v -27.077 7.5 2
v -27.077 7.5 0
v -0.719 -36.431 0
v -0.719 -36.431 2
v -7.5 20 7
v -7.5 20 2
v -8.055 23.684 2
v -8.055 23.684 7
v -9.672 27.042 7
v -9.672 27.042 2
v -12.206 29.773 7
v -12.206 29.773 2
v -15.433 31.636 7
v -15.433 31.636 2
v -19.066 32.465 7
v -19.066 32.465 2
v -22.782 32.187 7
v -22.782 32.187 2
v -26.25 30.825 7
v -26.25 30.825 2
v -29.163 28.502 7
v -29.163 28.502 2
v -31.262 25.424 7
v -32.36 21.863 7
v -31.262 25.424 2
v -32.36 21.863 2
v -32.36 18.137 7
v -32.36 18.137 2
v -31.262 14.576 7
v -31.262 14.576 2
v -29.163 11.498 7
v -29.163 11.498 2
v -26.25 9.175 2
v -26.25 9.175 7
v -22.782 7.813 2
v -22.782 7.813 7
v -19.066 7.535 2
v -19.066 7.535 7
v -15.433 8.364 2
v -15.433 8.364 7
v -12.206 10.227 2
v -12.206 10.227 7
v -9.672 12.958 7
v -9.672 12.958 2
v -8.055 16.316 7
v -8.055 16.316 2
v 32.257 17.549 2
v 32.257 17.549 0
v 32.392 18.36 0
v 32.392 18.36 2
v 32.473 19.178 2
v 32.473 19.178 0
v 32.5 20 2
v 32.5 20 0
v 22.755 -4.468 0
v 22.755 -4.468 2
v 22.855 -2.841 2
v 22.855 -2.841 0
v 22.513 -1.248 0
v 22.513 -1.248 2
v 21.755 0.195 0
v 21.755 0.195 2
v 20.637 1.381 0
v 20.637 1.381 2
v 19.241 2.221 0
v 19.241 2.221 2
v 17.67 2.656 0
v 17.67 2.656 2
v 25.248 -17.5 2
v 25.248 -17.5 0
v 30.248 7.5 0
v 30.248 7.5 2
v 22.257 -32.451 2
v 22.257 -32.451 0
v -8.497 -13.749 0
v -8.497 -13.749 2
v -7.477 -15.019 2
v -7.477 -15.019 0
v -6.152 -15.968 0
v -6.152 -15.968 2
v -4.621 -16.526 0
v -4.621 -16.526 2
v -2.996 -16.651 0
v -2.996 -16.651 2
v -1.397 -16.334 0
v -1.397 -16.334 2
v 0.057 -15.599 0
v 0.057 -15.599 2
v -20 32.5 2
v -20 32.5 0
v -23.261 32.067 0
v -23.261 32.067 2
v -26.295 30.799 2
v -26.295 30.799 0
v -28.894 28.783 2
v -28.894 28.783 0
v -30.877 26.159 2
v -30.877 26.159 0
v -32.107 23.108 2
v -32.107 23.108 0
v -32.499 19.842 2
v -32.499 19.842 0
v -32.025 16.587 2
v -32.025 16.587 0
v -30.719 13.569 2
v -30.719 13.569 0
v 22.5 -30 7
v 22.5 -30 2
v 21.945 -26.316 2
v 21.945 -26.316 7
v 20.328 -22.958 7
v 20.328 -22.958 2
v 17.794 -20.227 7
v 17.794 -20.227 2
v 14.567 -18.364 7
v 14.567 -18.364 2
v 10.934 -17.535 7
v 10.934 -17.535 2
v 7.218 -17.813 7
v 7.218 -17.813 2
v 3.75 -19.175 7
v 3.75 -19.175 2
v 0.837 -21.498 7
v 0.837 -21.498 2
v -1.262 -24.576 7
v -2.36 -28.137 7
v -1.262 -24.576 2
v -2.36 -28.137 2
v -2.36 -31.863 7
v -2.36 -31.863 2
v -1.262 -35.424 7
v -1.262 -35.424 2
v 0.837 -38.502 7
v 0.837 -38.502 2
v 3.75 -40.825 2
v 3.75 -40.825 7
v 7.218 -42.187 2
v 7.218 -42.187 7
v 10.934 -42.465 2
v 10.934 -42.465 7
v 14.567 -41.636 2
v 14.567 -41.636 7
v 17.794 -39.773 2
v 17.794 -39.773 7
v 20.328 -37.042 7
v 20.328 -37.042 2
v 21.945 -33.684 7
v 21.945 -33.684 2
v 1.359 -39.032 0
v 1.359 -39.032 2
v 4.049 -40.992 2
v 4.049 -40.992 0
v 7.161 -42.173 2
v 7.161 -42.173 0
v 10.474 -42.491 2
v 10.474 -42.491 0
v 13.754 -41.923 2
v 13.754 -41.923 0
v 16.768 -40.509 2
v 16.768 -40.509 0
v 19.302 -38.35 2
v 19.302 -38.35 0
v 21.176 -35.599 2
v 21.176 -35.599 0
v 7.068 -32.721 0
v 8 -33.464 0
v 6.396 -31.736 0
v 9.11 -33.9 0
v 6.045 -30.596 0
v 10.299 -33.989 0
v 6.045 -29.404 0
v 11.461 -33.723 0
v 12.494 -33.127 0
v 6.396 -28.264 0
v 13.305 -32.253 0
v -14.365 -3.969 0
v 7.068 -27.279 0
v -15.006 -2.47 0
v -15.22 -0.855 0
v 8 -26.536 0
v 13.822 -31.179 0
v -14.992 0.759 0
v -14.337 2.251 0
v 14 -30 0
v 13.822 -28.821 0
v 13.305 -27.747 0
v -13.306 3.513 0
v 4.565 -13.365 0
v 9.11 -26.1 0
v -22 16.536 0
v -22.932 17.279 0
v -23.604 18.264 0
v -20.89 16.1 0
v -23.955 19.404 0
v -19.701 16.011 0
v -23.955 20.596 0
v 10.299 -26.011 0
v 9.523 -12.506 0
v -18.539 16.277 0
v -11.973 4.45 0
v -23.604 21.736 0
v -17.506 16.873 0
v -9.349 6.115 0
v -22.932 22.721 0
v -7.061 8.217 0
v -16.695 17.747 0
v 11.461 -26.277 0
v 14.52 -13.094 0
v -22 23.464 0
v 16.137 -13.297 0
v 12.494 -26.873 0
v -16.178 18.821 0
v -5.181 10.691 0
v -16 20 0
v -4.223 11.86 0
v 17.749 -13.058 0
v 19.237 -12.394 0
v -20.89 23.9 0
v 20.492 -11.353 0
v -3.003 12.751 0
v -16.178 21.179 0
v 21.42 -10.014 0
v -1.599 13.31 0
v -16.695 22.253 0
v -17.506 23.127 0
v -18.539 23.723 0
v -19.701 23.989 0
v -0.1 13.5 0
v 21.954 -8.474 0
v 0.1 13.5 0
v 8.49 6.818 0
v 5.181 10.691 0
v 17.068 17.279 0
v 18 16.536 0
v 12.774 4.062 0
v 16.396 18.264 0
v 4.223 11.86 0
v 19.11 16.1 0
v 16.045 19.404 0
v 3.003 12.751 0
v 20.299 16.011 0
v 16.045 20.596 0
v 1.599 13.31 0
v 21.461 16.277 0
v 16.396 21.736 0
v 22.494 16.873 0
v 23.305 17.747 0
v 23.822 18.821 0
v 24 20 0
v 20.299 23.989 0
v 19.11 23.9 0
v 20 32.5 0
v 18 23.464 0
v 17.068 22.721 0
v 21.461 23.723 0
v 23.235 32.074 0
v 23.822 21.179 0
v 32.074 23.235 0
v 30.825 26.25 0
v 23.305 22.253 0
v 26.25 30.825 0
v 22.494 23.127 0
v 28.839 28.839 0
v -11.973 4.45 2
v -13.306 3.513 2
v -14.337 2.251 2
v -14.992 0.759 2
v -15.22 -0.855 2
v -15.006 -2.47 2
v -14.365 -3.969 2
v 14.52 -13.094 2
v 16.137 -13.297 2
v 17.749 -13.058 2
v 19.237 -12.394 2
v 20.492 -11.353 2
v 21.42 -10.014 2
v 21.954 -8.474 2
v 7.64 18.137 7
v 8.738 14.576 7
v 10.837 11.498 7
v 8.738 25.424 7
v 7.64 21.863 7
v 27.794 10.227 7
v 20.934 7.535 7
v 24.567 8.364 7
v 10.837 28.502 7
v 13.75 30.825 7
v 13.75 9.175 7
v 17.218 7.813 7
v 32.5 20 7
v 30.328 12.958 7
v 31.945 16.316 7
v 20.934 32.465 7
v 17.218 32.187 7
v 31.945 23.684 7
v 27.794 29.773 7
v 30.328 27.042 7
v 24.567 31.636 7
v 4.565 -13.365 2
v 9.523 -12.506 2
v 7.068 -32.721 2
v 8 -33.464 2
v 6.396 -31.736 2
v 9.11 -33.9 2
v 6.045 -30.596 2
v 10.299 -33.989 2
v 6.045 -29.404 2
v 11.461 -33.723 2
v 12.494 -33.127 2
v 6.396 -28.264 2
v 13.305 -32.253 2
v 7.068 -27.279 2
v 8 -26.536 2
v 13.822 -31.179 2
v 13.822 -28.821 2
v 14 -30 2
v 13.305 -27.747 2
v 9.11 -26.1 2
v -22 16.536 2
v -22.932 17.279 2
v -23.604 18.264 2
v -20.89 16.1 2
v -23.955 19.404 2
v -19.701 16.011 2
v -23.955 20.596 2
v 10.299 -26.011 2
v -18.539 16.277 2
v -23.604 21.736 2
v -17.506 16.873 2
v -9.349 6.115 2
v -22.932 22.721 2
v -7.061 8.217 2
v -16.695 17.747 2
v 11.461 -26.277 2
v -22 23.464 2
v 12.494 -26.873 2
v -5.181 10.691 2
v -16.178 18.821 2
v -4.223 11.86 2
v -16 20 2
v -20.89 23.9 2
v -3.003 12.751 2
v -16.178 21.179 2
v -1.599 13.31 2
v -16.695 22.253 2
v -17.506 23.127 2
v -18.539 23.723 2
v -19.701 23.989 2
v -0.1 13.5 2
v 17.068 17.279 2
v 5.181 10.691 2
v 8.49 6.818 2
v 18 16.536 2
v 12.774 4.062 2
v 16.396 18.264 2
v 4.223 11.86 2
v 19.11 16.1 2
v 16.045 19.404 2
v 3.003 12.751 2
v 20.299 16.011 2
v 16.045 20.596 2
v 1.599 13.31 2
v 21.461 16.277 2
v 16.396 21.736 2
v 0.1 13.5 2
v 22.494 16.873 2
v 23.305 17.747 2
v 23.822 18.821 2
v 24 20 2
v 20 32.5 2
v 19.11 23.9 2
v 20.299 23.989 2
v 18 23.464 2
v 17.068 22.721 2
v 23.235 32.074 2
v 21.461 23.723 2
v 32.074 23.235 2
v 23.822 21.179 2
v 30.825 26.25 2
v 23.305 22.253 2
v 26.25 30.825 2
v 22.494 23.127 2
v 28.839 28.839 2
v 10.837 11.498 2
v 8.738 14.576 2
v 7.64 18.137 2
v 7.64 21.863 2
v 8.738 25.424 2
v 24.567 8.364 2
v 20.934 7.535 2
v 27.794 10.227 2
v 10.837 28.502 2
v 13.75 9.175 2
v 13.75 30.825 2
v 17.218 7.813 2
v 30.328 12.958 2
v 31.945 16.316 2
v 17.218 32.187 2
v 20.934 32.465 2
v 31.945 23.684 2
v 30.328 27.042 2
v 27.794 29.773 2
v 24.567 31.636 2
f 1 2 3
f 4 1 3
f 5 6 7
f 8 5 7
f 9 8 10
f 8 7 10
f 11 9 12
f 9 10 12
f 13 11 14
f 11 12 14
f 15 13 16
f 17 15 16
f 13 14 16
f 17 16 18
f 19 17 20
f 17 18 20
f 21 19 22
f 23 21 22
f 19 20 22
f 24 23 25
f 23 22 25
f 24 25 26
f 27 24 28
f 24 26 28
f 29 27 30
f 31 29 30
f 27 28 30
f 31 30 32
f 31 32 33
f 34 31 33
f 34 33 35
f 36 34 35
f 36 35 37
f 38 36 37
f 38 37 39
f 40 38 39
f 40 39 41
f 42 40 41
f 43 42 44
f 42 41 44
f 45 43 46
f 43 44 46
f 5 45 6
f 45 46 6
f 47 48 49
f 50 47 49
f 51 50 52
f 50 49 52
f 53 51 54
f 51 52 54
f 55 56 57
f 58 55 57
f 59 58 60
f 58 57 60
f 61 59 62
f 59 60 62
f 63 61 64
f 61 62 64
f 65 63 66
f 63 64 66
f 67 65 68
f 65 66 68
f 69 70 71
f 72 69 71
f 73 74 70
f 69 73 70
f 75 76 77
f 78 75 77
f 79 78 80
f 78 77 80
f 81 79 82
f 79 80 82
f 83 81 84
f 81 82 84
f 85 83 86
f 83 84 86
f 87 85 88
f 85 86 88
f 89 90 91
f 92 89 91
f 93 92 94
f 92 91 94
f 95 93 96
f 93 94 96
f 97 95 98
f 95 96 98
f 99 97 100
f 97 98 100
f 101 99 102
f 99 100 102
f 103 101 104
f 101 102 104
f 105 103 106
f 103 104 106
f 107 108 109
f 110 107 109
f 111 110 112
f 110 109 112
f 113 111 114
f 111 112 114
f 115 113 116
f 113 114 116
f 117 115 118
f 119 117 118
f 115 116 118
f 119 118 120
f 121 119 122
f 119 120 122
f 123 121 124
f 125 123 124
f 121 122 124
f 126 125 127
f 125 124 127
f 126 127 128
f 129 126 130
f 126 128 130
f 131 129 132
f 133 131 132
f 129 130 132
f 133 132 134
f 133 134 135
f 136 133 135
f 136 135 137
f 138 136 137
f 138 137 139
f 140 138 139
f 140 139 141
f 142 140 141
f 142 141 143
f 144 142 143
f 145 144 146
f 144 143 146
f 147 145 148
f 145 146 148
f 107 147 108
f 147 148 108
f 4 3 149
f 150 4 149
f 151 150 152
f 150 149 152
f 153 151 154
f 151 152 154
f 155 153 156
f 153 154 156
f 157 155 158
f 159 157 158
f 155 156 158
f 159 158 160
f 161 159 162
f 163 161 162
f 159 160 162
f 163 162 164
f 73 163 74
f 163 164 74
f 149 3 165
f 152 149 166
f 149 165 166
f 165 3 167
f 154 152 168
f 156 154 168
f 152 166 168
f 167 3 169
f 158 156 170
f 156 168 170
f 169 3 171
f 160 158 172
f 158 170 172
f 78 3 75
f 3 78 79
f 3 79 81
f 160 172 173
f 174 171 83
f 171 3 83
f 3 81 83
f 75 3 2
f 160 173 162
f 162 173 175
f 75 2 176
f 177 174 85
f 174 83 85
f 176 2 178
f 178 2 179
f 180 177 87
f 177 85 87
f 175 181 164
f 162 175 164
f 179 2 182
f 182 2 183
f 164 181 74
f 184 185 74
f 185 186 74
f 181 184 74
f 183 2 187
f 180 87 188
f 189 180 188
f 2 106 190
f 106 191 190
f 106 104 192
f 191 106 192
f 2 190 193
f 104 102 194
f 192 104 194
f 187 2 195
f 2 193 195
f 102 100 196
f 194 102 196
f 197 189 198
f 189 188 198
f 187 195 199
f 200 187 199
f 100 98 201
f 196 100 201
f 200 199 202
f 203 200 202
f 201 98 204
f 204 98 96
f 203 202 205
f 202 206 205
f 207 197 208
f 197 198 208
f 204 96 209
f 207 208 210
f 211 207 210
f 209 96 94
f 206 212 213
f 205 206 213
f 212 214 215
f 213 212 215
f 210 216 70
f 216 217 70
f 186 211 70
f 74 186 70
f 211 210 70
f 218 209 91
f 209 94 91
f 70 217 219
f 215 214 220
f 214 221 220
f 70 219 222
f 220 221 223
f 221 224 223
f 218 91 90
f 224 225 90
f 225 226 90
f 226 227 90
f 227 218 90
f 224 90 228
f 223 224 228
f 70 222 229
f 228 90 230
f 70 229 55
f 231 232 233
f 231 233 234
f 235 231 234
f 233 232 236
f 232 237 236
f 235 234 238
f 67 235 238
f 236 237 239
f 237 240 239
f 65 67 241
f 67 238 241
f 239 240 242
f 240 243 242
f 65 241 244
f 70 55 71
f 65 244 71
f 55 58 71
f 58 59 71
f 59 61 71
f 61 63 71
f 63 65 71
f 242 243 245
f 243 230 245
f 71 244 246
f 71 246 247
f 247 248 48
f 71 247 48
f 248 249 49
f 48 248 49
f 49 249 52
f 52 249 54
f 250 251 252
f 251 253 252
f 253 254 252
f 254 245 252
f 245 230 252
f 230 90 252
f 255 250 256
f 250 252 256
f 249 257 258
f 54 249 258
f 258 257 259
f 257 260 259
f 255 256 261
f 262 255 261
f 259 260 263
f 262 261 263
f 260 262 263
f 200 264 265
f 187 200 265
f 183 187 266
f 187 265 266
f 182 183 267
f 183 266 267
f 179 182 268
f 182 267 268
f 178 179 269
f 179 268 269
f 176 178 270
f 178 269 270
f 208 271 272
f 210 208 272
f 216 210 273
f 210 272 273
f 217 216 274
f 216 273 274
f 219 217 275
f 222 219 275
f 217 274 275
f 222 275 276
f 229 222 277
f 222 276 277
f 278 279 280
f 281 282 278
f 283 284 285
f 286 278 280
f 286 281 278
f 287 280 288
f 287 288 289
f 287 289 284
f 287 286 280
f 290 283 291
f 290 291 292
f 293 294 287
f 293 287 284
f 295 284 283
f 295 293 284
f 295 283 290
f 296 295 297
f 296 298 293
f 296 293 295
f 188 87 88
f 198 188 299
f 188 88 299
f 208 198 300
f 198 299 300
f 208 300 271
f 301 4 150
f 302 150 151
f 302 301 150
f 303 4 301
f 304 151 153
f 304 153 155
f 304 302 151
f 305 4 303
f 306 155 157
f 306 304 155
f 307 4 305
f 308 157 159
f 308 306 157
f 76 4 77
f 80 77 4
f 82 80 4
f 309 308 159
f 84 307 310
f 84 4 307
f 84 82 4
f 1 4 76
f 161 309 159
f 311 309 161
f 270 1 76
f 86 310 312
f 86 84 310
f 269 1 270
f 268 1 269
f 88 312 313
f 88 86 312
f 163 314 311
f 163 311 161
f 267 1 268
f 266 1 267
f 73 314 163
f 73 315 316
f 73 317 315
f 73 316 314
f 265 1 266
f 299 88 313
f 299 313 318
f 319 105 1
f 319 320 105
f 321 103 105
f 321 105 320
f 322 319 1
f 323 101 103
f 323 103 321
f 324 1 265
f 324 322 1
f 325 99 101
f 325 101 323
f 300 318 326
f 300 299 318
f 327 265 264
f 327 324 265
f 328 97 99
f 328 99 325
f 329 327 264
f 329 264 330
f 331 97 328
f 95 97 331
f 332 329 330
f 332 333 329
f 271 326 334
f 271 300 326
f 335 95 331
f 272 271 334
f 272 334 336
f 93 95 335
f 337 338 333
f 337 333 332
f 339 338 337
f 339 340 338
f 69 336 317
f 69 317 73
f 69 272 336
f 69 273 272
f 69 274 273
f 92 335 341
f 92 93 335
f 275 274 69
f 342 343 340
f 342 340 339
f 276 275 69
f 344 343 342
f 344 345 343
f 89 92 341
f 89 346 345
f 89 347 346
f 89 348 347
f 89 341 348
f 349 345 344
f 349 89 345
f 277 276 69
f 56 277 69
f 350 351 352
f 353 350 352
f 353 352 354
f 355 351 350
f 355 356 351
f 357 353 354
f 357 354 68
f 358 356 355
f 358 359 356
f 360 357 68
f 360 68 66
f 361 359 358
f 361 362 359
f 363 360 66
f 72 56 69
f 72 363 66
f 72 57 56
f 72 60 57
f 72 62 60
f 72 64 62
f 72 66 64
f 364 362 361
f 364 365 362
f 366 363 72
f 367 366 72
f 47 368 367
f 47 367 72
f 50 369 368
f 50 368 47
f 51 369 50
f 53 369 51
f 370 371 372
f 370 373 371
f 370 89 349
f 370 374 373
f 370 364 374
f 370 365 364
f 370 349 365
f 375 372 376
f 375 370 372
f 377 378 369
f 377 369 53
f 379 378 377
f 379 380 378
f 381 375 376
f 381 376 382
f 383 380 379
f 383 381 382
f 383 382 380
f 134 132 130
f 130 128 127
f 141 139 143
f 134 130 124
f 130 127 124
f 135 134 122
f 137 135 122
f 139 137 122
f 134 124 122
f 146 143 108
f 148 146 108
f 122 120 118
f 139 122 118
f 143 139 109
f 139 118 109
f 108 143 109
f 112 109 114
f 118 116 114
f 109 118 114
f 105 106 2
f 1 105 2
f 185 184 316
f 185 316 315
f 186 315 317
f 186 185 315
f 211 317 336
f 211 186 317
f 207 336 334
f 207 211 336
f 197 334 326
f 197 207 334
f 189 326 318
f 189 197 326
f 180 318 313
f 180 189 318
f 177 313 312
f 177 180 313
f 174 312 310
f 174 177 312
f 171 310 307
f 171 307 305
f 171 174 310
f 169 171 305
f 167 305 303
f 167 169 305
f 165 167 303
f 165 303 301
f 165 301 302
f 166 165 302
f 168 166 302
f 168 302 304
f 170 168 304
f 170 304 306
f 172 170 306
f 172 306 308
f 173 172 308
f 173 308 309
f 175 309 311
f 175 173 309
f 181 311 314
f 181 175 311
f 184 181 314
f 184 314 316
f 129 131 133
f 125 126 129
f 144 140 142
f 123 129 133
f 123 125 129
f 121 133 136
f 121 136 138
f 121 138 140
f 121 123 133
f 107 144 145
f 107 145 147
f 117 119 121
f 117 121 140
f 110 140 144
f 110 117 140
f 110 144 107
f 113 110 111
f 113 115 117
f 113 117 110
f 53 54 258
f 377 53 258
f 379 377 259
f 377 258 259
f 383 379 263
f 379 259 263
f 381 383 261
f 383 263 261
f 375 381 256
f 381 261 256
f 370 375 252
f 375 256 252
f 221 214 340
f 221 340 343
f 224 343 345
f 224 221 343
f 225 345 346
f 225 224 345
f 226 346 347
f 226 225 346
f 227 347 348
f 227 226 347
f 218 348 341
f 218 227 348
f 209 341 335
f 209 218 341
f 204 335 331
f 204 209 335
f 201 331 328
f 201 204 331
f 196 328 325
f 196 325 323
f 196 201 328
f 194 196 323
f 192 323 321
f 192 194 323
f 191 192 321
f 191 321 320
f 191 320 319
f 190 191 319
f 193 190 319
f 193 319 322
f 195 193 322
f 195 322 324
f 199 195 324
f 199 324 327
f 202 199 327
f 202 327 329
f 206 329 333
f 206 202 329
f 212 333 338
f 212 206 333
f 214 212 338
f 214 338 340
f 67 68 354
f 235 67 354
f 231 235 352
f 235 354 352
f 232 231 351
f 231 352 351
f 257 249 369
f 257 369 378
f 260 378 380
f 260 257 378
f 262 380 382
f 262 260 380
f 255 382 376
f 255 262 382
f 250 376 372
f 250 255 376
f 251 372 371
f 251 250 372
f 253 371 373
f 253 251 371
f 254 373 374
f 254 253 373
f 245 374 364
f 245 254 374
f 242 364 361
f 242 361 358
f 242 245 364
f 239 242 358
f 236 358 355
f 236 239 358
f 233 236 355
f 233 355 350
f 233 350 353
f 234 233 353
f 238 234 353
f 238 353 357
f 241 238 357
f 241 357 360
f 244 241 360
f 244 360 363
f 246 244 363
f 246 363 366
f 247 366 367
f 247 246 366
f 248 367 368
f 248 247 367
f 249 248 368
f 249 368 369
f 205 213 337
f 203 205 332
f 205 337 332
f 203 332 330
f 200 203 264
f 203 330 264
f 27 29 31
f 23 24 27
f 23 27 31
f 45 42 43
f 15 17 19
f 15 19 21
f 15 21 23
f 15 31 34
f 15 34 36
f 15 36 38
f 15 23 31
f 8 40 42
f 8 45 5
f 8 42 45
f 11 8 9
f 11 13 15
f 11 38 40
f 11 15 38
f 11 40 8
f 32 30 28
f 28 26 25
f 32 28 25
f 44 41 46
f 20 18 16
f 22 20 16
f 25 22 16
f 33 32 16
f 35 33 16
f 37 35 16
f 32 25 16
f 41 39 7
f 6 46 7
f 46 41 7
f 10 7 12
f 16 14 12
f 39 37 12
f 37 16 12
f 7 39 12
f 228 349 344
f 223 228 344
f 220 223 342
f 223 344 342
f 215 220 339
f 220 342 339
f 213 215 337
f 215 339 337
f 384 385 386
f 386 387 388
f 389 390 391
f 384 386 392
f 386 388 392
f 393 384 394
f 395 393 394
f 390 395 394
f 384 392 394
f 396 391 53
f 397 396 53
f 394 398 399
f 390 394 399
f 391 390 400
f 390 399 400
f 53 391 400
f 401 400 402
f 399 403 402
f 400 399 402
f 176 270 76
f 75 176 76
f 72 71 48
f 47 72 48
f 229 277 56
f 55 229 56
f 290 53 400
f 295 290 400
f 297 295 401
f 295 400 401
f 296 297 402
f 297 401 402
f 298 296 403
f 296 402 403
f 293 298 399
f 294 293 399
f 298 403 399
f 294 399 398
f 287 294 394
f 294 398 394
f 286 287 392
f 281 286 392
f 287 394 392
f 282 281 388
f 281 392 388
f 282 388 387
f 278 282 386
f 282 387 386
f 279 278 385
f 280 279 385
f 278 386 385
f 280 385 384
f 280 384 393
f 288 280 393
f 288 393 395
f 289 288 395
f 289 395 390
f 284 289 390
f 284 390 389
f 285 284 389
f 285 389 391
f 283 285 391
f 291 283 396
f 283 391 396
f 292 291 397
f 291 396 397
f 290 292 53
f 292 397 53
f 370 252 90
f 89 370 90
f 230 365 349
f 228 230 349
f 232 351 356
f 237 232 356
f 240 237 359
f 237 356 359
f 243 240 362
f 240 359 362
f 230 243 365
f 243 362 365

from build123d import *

# Parameters (mm, degrees)
F0_R     = 4
F1_DEPTH = 2
F2_R     = 12.5
F3_DEPTH = 5
F5_DEPTH = 25


with BuildPart() as f1:
    # F0 (on Top) → F1 (new body)
    with BuildSketch(Plane.XY):
        with BuildLine():
            ThreePointArc((-20, 7.5), (-11.1611652352, 11.1611652352), (-7.5, 20))
            ThreePointArc((-7.5, 20), (-11.1611652352, 28.8388347648), (-20, 32.5))
            ThreePointArc((-20, 32.5), (-30.8774988344, 26.1587351873), (-30.7186615714, 13.5688030572))
            ThreePointArc((-30.7186615714, 13.5688030572), (-26.1587351873, 9.1225011656), (-20, 7.5))
        make_face()
        with Locations((-20, 20)):
            Circle(F0_R, mode=Mode.SUBTRACT)
        with BuildLine():
            ThreePointArc((32.5, 20), (28.8388347648, 28.8388347648), (20, 32.5))
            ThreePointArc((20, 32.5), (7.5, 20), (20, 7.5))
            ThreePointArc((20, 7.5), (27.9248613201, 10.3332232333), (32.2572584461, 17.5485483108))
            ThreePointArc((32.2572584461, 17.5485483108), (32.4391665834, 18.7682797754), (32.5, 20))
        make_face()
        with Locations((20, 20)):
            Circle(F0_R, mode=Mode.SUBTRACT)
        with BuildLine():
            ThreePointArc((-20, 32.5), (-11.1611652352, 28.8388347648), (-7.5, 20))
            ThreePointArc((-7.5, 20), (-11.1611652352, 11.1611652352), (-20, 7.5))
            Line((-20, 7.5), (20, 7.5))
            ThreePointArc((20, 7.5), (7.5, 20), (20, 32.5))
            Line((20, 32.5), (-20, 32.5))
        make_face()
        with BuildLine():
            ThreePointArc((32.2572584461, 17.5485483108), (27.9248613201, 10.3332232333), (20, 7.5))
            Line((20, 7.5), (30.247548784, 7.5))
            Line((30.247548784, 7.5), (32.2572584461, 17.5485483108))
        make_face()
        with BuildLine():
            Line((-27.0773797371, 7.5), (-20, 7.5))
            ThreePointArc((-20, 7.5), (-26.1587351873, 9.1225011656), (-30.7186615714, 13.5688030572))
            Line((-30.7186615714, 13.5688030572), (-27.0773797371, 7.5))
        make_face()
        Polygon((20, 7.5), (-20, 7.5), (-27.0773797371, 7.5), (-12.0773797371, -17.5), (9.9999999816, -17.5), (25.247548784, -17.5), (30.247548784, 7.5), align=None)
        with BuildLine():
            Line((-10.9942431227, -9.5869745326), (-13.702940576, -5.0724787771))
            ThreePointArc((-13.702940576, -5.0724787771), (-13.7664754812, -0.0365059251), (-9.4154759474, 2.5))
            Line((-9.4154759474, 2.5), (18.0495097568, 2.5))
            ThreePointArc((18.0495097568, 2.5), (21.9162204635, 0.669944528), (22.9524131353, -3.4805806757))
            Line((22.9524131353, -3.4805806757), (22.1131899082, -7.6766968108))
            ThreePointArc((22.1131899082, -7.6766968108), (20.0336392877, -11.140052848), (16.2297058541, -12.5))
            Line((16.2297058541, -12.5), (-5.8492855685, -12.5))
            ThreePointArc((-5.8492855685, -12.5), (-8.8054784584, -11.7211994405), (-10.9942431227, -9.5869745326))
        make_face(mode=Mode.SUBTRACT)
        with BuildLine():
            Line((25.247548784, -17.5), (9.9999999816, -17.5))
            ThreePointArc((9.9999999816, -17.5), (18.8388347583, -21.1611652286), (22.5, -30))
            ThreePointArc((22.5, -30), (22.4391665834, -31.2317202246), (22.2572584461, -32.4514516892))
            Line((22.2572584461, -32.4514516892), (25.247548784, -17.5))
        make_face()
        with BuildLine():
            Line((9.9999999816, -17.5), (-12.0773797371, -17.5))
            Line((-12.0773797371, -17.5), (-0.7186615714, -36.4311969428))
            ThreePointArc((-0.7186615714, -36.4311969428), (-0.877498839, -23.8412648207), (9.9999999816, -17.5))
        make_face()
        with BuildLine():
            ThreePointArc((9.9999999816, -17.5), (-0.877498839, -23.8412648207), (-0.7186615714, -36.4311969428))
            ThreePointArc((-0.7186615714, -36.4311969428), (12.1334041241, -42.3165980223), (22.2572584461, -32.4514516892))
            ThreePointArc((22.2572584461, -32.4514516892), (22.4391665834, -31.2317202246), (22.5, -30))
            ThreePointArc((22.5, -30), (18.8388347583, -21.1611652286), (9.9999999816, -17.5))
        make_face()
        with Locations((10, -30)):
            Circle(F0_R, mode=Mode.SUBTRACT)
        with BuildLine():
            ThreePointArc((-9.4154759474, 2.5), (-13.7664754812, -0.0365059251), (-13.702940576, -5.0724787771))
            Line((-13.702940576, -5.0724787771), (-10.9942431227, -9.5869745326))
            ThreePointArc((-10.9942431227, -9.5869745326), (-8.8054784584, -11.7211994405), (-5.8492855685, -12.5))
            Line((-5.8492855685, -12.5), (16.2297058541, -12.5))
            ThreePointArc((16.2297058541, -12.5), (20.0336392877, -11.140052848), (22.1131899082, -7.6766968108))
            Line((22.1131899082, -7.6766968108), (22.9524131353, -3.4805806757))
            ThreePointArc((22.9524131353, -3.4805806757), (21.9162204635, 0.669944528), (18.0495097568, 2.5))
            Line((18.0495097568, 2.5), (-9.4154759474, 2.5))
        make_face()
    extrude(amount=F1_DEPTH)

    # F4 (on face) → F5 (cut)
    with BuildSketch(Plane.XY.offset(2)):
        with BuildLine():
            ThreePointArc((-5.1810381708, 10.6914893617), (-8.1581373683, 7.1151139155), (-11.9725222189, 4.4497716906))
            ThreePointArc((-11.9725222189, 4.4497716906), (-14.9916642184, 0.7586032448), (-14.3652016768, -3.9687096909))
            Line((-14.3652016768, -3.9687096909), (-8.4971916928, -13.7487263309))
            ThreePointArc((-8.4971916928, -13.7487263309), (-4.620839122, -16.5261052491), (0.0568469181, -15.5991768711))
            ThreePointArc((0.0568469181, -15.5991768711), (7.0132343369, -12.7567627496), (14.5203632426, -13.0938970737))
            ThreePointArc((14.5203632426, -13.0938970737), (19.2372960285, -12.3935483475), (21.9536861227, -8.4742157383))
            Line((21.9536861227, -8.4742157383), (22.7550240126, -4.4675262887))
            ThreePointArc((22.7550240126, -4.4675262887), (21.7550226215, 0.1950846175), (17.6702957138, 2.6557652824))
            ThreePointArc((17.6702957138, 2.6557652824), (10.5309766737, 5.2830846559), (5.1810381708, 10.6914893617))
            ThreePointArc((5.1810381708, 10.6914893617), (3.0029279389, 12.7511396939), (0.1002512579, 13.5))
            Line((0.1002512579, 13.5), (-0.1002512579, 13.5))
            ThreePointArc((-0.1002512579, 13.5), (-3.0029279389, 12.7511396939), (-5.1810381708, 10.6914893617))
        make_face()
    extrude(amount=-F5_DEPTH, mode=Mode.SUBTRACT)


with BuildPart() as f3:
    # F2 (on face) → F3 (new body)
    with BuildSketch(Plane.XY.offset(2)):
        with Locations((-20, 20)):
            Circle(F2_R)
    extrude(amount=F3_DEPTH)


with BuildPart() as f3b:
    # F2 (on face) → F3, piece 2 (new body)
    with BuildSketch(Plane.XY.offset(2)):
        with Locations((20, 20)):
            Circle(F2_R)
    extrude(amount=F3_DEPTH)


with BuildPart() as f3c:
    # F2 (on face) → F3, piece 3 (new body)
    with BuildSketch(Plane.XY.offset(2)):
        with Locations((10, -30)):
            Circle(F2_R)
    extrude(amount=F3_DEPTH)


solid = Compound([f1.part, f3.part, f3b.part, f3c.part])
